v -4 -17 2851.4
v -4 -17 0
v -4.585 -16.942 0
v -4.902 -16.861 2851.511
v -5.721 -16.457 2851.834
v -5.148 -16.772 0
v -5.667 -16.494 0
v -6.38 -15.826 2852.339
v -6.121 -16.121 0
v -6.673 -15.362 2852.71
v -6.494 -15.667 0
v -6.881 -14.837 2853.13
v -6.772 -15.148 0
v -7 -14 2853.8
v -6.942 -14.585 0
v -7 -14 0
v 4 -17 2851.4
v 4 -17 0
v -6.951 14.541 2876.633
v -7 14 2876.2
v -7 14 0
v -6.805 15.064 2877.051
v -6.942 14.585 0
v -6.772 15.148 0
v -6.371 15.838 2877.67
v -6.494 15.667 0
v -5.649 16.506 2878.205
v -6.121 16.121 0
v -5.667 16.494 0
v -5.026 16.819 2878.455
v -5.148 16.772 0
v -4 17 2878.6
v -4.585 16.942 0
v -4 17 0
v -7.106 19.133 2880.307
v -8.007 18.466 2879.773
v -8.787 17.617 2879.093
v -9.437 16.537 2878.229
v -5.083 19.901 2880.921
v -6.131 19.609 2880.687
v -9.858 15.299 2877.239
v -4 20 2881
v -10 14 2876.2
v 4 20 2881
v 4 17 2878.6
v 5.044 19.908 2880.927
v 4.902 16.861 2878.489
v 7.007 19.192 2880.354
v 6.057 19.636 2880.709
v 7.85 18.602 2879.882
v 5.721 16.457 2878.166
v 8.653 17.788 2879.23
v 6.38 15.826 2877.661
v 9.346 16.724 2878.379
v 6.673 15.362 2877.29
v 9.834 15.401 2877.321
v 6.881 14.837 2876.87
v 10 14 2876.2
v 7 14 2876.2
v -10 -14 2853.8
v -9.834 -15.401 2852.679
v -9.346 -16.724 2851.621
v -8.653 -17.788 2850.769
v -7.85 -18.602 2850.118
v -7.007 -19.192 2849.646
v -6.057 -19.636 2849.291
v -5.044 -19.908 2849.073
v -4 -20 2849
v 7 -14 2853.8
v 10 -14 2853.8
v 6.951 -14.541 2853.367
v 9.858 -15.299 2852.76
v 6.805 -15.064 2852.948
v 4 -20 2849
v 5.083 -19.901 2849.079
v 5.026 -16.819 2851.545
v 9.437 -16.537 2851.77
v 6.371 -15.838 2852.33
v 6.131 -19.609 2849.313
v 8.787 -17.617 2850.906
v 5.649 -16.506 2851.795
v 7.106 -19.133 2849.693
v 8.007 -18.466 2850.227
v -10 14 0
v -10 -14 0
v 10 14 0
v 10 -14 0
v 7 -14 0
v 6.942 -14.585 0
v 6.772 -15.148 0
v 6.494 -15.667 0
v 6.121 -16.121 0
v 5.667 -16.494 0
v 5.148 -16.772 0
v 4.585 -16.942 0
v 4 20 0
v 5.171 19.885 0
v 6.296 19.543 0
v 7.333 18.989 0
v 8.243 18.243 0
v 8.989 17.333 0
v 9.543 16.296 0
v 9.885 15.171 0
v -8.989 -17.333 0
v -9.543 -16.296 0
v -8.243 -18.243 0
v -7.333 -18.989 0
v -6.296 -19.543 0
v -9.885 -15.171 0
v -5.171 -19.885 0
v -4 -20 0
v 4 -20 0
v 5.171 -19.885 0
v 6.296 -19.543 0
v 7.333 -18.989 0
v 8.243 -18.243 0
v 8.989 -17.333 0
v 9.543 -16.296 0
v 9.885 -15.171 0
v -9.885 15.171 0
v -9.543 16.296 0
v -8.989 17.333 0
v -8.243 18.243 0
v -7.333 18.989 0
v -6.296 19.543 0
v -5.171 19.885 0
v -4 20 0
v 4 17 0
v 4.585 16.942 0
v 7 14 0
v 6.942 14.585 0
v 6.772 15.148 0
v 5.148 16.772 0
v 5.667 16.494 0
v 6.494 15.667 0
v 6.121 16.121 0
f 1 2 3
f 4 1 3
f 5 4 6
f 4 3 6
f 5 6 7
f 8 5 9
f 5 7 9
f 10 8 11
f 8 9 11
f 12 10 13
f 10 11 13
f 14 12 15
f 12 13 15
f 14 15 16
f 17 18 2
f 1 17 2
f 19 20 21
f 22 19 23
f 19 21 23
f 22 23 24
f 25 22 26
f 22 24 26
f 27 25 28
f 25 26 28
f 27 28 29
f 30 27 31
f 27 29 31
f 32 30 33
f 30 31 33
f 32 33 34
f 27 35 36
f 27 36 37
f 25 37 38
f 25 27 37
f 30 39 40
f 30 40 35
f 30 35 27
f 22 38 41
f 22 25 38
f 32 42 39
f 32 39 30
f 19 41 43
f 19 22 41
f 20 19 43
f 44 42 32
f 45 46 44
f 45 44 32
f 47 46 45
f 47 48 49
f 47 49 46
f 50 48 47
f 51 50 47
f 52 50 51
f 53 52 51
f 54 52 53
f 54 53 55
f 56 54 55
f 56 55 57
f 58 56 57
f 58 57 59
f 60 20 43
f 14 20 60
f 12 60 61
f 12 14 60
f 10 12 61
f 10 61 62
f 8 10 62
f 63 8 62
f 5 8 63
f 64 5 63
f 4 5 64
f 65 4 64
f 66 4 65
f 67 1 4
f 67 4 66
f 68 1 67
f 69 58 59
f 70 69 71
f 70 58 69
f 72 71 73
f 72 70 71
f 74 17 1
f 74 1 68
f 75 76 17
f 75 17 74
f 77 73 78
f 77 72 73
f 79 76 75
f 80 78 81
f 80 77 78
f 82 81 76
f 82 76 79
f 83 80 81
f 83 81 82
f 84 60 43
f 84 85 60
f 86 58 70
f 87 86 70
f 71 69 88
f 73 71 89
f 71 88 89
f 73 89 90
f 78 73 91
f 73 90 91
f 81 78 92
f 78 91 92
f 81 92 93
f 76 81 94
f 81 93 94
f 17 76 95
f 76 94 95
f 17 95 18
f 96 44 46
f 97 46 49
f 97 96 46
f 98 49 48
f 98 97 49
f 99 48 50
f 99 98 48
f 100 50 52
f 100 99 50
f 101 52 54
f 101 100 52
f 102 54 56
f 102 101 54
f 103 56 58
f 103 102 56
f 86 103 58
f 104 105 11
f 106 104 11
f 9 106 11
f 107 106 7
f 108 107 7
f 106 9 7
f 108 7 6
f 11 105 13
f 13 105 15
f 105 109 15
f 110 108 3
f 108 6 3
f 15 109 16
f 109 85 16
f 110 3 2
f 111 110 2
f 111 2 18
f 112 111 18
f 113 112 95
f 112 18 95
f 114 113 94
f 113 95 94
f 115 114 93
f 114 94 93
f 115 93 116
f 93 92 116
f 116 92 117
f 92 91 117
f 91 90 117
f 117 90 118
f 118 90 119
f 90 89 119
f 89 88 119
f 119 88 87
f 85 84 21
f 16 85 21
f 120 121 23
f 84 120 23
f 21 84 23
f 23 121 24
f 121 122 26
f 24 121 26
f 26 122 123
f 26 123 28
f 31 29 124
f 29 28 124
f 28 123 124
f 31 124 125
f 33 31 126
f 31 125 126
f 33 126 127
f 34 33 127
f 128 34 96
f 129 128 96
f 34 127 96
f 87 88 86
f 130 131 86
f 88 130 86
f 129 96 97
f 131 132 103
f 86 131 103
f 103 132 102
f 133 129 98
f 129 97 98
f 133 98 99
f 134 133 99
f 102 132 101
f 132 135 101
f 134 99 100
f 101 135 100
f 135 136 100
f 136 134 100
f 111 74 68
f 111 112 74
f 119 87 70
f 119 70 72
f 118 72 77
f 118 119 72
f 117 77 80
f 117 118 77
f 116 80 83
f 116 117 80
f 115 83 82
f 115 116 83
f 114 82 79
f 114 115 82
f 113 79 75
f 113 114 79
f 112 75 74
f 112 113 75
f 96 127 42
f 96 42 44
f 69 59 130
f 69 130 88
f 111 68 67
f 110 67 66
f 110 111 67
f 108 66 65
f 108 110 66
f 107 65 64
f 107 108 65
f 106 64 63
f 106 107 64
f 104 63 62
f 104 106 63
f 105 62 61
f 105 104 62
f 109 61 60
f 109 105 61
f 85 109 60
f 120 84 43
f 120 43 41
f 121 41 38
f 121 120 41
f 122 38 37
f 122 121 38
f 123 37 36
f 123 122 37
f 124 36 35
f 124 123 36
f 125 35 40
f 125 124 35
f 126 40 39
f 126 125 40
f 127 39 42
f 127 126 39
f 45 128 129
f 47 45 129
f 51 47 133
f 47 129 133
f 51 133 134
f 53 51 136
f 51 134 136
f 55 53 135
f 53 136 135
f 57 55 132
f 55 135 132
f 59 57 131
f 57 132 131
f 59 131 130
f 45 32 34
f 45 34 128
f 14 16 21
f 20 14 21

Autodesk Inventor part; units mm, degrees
ref_plane "YZ Plane" through (0, 0, 0) normal (1, 0, 0) x (0, 1, 0)
ref_plane "Start Plane" through (0, 0, 0) normal (0, 0, 1) x (1, 0, 0)
ref_plane "End Plane" through (0, 0, 2881) normal (0, 0, 1) x (1, 0, 0)
sketch "Sketch" plane through (0, 0, 0) normal (0, 0, 1) x (1, 0, 0)
  line L0 (-10, -14) -> (-10, 14)
  line L1 (-4, 20) -> (4, 20)
  line L2 (10, 14) -> (10, -14)
  line L3 (4, -20) -> (-4, -20)
  arc A0 (-10, -14) -> (-4, -20) centre (-4, -14) ccw
  arc A1 (10, 14) -> (4, 20) centre (4, 14) ccw
  arc A2 (-4, 20) -> (-10, 14) centre (-4, 14) ccw
  arc A3 (4, -20) -> (10, -14) centre (4, -14) ccw
  arc A4 (-4, 17) -> (-7, 14) centre (-4, 14) ccw
  line L4 (-4, 17) -> (4, 17)
  arc A5 (7, 14) -> (4, 17) centre (4, 14) ccw
  line L5 (7, 14) -> (7, -14)
  arc A6 (4, -17) -> (7, -14) centre (4, -14) ccw
  line L6 (4, -17) -> (-4, -17)
  arc A7 (-7, -14) -> (-4, -17) centre (-4, -14) ccw
  line L7 (-7, -14) -> (-7, 14)
  line L8 (0, 29.7397) -> (0, -29.7397) construction
  line L9 (-15.7397, 0) -> (15.7397, 0) construction
  dimension "d7" = 6
  dimension "d9" = 20
  dimension "d11" = 40
  dimension "d12" = 3
  dimension "d15" = 10
  dimension "d16" = 20
extrude "Body" add sketch "Sketch" along normal up to surface (2881 mm away) from surface at 0
sketch "Sketch3" plane through (0, 0, 0) normal (0, 0, 1) x (1, 0, 0)
  line L0 (0, 0) -> (10, 0)
ref_plane "Work Plane3" through (0, 0, 0) normal (0, -1, 0) x (1, 0, 0)
sketch "Sketch5" plane through (10, -14, 2881) normal (1, 0, 0) x (0, 0, -1)
  line L0 (0, 28) -> (0, 34) projected
  line L1 (0, 34) -> (32.0002, -6)
  line L2 (2881, -6) -> (0, -6) projected
  line L3 (0, -6) -> (0, 0)
  line L4 (0, 28) -> (0, 0)
  point P0 (2881, 14)
  dimension "d19" = 38.66
extrude "Extrusion2" cut sketch "Sketch5" against normal through all
sketch "Sketch4" plane through (0, 0, 0) normal (0, -1, 0) x (1, 0, 0)
  line L0 (-2, 0) -> (12, 0) projected
  line L1 (-2, 2881) -> (12, 2881) projected
  dimension "d18" = 2881
equation "\"d7\" = G_IR"
equation "\"d9\" = G_W"
equation "\"d11\" = G_H"
equation "\"d12\" = G_T"
equation "\"d15\" = 0.5 * d9"
equation "\"d16\" = 0.5 * d11"
equation "\"d3\" = G_L"
equation "\"G_W\" = 20"
equation "\"G_H\" = 40"
equation "\"G_T\" = 3"
equation "\"G_IR\" = 6"
equation "\"G_L\" = d18"
equation "\"G_OFFSET_START\" = 0"
equation "\"G_OFFSET_END\" = 0"
equation "\"d14\" = G_OFFSET_END + B_L"
equation "\"B_L\" = 2881"
properties part number "ISO 4019 - 40x20x3 - 2881" material "Steel, Mild"
